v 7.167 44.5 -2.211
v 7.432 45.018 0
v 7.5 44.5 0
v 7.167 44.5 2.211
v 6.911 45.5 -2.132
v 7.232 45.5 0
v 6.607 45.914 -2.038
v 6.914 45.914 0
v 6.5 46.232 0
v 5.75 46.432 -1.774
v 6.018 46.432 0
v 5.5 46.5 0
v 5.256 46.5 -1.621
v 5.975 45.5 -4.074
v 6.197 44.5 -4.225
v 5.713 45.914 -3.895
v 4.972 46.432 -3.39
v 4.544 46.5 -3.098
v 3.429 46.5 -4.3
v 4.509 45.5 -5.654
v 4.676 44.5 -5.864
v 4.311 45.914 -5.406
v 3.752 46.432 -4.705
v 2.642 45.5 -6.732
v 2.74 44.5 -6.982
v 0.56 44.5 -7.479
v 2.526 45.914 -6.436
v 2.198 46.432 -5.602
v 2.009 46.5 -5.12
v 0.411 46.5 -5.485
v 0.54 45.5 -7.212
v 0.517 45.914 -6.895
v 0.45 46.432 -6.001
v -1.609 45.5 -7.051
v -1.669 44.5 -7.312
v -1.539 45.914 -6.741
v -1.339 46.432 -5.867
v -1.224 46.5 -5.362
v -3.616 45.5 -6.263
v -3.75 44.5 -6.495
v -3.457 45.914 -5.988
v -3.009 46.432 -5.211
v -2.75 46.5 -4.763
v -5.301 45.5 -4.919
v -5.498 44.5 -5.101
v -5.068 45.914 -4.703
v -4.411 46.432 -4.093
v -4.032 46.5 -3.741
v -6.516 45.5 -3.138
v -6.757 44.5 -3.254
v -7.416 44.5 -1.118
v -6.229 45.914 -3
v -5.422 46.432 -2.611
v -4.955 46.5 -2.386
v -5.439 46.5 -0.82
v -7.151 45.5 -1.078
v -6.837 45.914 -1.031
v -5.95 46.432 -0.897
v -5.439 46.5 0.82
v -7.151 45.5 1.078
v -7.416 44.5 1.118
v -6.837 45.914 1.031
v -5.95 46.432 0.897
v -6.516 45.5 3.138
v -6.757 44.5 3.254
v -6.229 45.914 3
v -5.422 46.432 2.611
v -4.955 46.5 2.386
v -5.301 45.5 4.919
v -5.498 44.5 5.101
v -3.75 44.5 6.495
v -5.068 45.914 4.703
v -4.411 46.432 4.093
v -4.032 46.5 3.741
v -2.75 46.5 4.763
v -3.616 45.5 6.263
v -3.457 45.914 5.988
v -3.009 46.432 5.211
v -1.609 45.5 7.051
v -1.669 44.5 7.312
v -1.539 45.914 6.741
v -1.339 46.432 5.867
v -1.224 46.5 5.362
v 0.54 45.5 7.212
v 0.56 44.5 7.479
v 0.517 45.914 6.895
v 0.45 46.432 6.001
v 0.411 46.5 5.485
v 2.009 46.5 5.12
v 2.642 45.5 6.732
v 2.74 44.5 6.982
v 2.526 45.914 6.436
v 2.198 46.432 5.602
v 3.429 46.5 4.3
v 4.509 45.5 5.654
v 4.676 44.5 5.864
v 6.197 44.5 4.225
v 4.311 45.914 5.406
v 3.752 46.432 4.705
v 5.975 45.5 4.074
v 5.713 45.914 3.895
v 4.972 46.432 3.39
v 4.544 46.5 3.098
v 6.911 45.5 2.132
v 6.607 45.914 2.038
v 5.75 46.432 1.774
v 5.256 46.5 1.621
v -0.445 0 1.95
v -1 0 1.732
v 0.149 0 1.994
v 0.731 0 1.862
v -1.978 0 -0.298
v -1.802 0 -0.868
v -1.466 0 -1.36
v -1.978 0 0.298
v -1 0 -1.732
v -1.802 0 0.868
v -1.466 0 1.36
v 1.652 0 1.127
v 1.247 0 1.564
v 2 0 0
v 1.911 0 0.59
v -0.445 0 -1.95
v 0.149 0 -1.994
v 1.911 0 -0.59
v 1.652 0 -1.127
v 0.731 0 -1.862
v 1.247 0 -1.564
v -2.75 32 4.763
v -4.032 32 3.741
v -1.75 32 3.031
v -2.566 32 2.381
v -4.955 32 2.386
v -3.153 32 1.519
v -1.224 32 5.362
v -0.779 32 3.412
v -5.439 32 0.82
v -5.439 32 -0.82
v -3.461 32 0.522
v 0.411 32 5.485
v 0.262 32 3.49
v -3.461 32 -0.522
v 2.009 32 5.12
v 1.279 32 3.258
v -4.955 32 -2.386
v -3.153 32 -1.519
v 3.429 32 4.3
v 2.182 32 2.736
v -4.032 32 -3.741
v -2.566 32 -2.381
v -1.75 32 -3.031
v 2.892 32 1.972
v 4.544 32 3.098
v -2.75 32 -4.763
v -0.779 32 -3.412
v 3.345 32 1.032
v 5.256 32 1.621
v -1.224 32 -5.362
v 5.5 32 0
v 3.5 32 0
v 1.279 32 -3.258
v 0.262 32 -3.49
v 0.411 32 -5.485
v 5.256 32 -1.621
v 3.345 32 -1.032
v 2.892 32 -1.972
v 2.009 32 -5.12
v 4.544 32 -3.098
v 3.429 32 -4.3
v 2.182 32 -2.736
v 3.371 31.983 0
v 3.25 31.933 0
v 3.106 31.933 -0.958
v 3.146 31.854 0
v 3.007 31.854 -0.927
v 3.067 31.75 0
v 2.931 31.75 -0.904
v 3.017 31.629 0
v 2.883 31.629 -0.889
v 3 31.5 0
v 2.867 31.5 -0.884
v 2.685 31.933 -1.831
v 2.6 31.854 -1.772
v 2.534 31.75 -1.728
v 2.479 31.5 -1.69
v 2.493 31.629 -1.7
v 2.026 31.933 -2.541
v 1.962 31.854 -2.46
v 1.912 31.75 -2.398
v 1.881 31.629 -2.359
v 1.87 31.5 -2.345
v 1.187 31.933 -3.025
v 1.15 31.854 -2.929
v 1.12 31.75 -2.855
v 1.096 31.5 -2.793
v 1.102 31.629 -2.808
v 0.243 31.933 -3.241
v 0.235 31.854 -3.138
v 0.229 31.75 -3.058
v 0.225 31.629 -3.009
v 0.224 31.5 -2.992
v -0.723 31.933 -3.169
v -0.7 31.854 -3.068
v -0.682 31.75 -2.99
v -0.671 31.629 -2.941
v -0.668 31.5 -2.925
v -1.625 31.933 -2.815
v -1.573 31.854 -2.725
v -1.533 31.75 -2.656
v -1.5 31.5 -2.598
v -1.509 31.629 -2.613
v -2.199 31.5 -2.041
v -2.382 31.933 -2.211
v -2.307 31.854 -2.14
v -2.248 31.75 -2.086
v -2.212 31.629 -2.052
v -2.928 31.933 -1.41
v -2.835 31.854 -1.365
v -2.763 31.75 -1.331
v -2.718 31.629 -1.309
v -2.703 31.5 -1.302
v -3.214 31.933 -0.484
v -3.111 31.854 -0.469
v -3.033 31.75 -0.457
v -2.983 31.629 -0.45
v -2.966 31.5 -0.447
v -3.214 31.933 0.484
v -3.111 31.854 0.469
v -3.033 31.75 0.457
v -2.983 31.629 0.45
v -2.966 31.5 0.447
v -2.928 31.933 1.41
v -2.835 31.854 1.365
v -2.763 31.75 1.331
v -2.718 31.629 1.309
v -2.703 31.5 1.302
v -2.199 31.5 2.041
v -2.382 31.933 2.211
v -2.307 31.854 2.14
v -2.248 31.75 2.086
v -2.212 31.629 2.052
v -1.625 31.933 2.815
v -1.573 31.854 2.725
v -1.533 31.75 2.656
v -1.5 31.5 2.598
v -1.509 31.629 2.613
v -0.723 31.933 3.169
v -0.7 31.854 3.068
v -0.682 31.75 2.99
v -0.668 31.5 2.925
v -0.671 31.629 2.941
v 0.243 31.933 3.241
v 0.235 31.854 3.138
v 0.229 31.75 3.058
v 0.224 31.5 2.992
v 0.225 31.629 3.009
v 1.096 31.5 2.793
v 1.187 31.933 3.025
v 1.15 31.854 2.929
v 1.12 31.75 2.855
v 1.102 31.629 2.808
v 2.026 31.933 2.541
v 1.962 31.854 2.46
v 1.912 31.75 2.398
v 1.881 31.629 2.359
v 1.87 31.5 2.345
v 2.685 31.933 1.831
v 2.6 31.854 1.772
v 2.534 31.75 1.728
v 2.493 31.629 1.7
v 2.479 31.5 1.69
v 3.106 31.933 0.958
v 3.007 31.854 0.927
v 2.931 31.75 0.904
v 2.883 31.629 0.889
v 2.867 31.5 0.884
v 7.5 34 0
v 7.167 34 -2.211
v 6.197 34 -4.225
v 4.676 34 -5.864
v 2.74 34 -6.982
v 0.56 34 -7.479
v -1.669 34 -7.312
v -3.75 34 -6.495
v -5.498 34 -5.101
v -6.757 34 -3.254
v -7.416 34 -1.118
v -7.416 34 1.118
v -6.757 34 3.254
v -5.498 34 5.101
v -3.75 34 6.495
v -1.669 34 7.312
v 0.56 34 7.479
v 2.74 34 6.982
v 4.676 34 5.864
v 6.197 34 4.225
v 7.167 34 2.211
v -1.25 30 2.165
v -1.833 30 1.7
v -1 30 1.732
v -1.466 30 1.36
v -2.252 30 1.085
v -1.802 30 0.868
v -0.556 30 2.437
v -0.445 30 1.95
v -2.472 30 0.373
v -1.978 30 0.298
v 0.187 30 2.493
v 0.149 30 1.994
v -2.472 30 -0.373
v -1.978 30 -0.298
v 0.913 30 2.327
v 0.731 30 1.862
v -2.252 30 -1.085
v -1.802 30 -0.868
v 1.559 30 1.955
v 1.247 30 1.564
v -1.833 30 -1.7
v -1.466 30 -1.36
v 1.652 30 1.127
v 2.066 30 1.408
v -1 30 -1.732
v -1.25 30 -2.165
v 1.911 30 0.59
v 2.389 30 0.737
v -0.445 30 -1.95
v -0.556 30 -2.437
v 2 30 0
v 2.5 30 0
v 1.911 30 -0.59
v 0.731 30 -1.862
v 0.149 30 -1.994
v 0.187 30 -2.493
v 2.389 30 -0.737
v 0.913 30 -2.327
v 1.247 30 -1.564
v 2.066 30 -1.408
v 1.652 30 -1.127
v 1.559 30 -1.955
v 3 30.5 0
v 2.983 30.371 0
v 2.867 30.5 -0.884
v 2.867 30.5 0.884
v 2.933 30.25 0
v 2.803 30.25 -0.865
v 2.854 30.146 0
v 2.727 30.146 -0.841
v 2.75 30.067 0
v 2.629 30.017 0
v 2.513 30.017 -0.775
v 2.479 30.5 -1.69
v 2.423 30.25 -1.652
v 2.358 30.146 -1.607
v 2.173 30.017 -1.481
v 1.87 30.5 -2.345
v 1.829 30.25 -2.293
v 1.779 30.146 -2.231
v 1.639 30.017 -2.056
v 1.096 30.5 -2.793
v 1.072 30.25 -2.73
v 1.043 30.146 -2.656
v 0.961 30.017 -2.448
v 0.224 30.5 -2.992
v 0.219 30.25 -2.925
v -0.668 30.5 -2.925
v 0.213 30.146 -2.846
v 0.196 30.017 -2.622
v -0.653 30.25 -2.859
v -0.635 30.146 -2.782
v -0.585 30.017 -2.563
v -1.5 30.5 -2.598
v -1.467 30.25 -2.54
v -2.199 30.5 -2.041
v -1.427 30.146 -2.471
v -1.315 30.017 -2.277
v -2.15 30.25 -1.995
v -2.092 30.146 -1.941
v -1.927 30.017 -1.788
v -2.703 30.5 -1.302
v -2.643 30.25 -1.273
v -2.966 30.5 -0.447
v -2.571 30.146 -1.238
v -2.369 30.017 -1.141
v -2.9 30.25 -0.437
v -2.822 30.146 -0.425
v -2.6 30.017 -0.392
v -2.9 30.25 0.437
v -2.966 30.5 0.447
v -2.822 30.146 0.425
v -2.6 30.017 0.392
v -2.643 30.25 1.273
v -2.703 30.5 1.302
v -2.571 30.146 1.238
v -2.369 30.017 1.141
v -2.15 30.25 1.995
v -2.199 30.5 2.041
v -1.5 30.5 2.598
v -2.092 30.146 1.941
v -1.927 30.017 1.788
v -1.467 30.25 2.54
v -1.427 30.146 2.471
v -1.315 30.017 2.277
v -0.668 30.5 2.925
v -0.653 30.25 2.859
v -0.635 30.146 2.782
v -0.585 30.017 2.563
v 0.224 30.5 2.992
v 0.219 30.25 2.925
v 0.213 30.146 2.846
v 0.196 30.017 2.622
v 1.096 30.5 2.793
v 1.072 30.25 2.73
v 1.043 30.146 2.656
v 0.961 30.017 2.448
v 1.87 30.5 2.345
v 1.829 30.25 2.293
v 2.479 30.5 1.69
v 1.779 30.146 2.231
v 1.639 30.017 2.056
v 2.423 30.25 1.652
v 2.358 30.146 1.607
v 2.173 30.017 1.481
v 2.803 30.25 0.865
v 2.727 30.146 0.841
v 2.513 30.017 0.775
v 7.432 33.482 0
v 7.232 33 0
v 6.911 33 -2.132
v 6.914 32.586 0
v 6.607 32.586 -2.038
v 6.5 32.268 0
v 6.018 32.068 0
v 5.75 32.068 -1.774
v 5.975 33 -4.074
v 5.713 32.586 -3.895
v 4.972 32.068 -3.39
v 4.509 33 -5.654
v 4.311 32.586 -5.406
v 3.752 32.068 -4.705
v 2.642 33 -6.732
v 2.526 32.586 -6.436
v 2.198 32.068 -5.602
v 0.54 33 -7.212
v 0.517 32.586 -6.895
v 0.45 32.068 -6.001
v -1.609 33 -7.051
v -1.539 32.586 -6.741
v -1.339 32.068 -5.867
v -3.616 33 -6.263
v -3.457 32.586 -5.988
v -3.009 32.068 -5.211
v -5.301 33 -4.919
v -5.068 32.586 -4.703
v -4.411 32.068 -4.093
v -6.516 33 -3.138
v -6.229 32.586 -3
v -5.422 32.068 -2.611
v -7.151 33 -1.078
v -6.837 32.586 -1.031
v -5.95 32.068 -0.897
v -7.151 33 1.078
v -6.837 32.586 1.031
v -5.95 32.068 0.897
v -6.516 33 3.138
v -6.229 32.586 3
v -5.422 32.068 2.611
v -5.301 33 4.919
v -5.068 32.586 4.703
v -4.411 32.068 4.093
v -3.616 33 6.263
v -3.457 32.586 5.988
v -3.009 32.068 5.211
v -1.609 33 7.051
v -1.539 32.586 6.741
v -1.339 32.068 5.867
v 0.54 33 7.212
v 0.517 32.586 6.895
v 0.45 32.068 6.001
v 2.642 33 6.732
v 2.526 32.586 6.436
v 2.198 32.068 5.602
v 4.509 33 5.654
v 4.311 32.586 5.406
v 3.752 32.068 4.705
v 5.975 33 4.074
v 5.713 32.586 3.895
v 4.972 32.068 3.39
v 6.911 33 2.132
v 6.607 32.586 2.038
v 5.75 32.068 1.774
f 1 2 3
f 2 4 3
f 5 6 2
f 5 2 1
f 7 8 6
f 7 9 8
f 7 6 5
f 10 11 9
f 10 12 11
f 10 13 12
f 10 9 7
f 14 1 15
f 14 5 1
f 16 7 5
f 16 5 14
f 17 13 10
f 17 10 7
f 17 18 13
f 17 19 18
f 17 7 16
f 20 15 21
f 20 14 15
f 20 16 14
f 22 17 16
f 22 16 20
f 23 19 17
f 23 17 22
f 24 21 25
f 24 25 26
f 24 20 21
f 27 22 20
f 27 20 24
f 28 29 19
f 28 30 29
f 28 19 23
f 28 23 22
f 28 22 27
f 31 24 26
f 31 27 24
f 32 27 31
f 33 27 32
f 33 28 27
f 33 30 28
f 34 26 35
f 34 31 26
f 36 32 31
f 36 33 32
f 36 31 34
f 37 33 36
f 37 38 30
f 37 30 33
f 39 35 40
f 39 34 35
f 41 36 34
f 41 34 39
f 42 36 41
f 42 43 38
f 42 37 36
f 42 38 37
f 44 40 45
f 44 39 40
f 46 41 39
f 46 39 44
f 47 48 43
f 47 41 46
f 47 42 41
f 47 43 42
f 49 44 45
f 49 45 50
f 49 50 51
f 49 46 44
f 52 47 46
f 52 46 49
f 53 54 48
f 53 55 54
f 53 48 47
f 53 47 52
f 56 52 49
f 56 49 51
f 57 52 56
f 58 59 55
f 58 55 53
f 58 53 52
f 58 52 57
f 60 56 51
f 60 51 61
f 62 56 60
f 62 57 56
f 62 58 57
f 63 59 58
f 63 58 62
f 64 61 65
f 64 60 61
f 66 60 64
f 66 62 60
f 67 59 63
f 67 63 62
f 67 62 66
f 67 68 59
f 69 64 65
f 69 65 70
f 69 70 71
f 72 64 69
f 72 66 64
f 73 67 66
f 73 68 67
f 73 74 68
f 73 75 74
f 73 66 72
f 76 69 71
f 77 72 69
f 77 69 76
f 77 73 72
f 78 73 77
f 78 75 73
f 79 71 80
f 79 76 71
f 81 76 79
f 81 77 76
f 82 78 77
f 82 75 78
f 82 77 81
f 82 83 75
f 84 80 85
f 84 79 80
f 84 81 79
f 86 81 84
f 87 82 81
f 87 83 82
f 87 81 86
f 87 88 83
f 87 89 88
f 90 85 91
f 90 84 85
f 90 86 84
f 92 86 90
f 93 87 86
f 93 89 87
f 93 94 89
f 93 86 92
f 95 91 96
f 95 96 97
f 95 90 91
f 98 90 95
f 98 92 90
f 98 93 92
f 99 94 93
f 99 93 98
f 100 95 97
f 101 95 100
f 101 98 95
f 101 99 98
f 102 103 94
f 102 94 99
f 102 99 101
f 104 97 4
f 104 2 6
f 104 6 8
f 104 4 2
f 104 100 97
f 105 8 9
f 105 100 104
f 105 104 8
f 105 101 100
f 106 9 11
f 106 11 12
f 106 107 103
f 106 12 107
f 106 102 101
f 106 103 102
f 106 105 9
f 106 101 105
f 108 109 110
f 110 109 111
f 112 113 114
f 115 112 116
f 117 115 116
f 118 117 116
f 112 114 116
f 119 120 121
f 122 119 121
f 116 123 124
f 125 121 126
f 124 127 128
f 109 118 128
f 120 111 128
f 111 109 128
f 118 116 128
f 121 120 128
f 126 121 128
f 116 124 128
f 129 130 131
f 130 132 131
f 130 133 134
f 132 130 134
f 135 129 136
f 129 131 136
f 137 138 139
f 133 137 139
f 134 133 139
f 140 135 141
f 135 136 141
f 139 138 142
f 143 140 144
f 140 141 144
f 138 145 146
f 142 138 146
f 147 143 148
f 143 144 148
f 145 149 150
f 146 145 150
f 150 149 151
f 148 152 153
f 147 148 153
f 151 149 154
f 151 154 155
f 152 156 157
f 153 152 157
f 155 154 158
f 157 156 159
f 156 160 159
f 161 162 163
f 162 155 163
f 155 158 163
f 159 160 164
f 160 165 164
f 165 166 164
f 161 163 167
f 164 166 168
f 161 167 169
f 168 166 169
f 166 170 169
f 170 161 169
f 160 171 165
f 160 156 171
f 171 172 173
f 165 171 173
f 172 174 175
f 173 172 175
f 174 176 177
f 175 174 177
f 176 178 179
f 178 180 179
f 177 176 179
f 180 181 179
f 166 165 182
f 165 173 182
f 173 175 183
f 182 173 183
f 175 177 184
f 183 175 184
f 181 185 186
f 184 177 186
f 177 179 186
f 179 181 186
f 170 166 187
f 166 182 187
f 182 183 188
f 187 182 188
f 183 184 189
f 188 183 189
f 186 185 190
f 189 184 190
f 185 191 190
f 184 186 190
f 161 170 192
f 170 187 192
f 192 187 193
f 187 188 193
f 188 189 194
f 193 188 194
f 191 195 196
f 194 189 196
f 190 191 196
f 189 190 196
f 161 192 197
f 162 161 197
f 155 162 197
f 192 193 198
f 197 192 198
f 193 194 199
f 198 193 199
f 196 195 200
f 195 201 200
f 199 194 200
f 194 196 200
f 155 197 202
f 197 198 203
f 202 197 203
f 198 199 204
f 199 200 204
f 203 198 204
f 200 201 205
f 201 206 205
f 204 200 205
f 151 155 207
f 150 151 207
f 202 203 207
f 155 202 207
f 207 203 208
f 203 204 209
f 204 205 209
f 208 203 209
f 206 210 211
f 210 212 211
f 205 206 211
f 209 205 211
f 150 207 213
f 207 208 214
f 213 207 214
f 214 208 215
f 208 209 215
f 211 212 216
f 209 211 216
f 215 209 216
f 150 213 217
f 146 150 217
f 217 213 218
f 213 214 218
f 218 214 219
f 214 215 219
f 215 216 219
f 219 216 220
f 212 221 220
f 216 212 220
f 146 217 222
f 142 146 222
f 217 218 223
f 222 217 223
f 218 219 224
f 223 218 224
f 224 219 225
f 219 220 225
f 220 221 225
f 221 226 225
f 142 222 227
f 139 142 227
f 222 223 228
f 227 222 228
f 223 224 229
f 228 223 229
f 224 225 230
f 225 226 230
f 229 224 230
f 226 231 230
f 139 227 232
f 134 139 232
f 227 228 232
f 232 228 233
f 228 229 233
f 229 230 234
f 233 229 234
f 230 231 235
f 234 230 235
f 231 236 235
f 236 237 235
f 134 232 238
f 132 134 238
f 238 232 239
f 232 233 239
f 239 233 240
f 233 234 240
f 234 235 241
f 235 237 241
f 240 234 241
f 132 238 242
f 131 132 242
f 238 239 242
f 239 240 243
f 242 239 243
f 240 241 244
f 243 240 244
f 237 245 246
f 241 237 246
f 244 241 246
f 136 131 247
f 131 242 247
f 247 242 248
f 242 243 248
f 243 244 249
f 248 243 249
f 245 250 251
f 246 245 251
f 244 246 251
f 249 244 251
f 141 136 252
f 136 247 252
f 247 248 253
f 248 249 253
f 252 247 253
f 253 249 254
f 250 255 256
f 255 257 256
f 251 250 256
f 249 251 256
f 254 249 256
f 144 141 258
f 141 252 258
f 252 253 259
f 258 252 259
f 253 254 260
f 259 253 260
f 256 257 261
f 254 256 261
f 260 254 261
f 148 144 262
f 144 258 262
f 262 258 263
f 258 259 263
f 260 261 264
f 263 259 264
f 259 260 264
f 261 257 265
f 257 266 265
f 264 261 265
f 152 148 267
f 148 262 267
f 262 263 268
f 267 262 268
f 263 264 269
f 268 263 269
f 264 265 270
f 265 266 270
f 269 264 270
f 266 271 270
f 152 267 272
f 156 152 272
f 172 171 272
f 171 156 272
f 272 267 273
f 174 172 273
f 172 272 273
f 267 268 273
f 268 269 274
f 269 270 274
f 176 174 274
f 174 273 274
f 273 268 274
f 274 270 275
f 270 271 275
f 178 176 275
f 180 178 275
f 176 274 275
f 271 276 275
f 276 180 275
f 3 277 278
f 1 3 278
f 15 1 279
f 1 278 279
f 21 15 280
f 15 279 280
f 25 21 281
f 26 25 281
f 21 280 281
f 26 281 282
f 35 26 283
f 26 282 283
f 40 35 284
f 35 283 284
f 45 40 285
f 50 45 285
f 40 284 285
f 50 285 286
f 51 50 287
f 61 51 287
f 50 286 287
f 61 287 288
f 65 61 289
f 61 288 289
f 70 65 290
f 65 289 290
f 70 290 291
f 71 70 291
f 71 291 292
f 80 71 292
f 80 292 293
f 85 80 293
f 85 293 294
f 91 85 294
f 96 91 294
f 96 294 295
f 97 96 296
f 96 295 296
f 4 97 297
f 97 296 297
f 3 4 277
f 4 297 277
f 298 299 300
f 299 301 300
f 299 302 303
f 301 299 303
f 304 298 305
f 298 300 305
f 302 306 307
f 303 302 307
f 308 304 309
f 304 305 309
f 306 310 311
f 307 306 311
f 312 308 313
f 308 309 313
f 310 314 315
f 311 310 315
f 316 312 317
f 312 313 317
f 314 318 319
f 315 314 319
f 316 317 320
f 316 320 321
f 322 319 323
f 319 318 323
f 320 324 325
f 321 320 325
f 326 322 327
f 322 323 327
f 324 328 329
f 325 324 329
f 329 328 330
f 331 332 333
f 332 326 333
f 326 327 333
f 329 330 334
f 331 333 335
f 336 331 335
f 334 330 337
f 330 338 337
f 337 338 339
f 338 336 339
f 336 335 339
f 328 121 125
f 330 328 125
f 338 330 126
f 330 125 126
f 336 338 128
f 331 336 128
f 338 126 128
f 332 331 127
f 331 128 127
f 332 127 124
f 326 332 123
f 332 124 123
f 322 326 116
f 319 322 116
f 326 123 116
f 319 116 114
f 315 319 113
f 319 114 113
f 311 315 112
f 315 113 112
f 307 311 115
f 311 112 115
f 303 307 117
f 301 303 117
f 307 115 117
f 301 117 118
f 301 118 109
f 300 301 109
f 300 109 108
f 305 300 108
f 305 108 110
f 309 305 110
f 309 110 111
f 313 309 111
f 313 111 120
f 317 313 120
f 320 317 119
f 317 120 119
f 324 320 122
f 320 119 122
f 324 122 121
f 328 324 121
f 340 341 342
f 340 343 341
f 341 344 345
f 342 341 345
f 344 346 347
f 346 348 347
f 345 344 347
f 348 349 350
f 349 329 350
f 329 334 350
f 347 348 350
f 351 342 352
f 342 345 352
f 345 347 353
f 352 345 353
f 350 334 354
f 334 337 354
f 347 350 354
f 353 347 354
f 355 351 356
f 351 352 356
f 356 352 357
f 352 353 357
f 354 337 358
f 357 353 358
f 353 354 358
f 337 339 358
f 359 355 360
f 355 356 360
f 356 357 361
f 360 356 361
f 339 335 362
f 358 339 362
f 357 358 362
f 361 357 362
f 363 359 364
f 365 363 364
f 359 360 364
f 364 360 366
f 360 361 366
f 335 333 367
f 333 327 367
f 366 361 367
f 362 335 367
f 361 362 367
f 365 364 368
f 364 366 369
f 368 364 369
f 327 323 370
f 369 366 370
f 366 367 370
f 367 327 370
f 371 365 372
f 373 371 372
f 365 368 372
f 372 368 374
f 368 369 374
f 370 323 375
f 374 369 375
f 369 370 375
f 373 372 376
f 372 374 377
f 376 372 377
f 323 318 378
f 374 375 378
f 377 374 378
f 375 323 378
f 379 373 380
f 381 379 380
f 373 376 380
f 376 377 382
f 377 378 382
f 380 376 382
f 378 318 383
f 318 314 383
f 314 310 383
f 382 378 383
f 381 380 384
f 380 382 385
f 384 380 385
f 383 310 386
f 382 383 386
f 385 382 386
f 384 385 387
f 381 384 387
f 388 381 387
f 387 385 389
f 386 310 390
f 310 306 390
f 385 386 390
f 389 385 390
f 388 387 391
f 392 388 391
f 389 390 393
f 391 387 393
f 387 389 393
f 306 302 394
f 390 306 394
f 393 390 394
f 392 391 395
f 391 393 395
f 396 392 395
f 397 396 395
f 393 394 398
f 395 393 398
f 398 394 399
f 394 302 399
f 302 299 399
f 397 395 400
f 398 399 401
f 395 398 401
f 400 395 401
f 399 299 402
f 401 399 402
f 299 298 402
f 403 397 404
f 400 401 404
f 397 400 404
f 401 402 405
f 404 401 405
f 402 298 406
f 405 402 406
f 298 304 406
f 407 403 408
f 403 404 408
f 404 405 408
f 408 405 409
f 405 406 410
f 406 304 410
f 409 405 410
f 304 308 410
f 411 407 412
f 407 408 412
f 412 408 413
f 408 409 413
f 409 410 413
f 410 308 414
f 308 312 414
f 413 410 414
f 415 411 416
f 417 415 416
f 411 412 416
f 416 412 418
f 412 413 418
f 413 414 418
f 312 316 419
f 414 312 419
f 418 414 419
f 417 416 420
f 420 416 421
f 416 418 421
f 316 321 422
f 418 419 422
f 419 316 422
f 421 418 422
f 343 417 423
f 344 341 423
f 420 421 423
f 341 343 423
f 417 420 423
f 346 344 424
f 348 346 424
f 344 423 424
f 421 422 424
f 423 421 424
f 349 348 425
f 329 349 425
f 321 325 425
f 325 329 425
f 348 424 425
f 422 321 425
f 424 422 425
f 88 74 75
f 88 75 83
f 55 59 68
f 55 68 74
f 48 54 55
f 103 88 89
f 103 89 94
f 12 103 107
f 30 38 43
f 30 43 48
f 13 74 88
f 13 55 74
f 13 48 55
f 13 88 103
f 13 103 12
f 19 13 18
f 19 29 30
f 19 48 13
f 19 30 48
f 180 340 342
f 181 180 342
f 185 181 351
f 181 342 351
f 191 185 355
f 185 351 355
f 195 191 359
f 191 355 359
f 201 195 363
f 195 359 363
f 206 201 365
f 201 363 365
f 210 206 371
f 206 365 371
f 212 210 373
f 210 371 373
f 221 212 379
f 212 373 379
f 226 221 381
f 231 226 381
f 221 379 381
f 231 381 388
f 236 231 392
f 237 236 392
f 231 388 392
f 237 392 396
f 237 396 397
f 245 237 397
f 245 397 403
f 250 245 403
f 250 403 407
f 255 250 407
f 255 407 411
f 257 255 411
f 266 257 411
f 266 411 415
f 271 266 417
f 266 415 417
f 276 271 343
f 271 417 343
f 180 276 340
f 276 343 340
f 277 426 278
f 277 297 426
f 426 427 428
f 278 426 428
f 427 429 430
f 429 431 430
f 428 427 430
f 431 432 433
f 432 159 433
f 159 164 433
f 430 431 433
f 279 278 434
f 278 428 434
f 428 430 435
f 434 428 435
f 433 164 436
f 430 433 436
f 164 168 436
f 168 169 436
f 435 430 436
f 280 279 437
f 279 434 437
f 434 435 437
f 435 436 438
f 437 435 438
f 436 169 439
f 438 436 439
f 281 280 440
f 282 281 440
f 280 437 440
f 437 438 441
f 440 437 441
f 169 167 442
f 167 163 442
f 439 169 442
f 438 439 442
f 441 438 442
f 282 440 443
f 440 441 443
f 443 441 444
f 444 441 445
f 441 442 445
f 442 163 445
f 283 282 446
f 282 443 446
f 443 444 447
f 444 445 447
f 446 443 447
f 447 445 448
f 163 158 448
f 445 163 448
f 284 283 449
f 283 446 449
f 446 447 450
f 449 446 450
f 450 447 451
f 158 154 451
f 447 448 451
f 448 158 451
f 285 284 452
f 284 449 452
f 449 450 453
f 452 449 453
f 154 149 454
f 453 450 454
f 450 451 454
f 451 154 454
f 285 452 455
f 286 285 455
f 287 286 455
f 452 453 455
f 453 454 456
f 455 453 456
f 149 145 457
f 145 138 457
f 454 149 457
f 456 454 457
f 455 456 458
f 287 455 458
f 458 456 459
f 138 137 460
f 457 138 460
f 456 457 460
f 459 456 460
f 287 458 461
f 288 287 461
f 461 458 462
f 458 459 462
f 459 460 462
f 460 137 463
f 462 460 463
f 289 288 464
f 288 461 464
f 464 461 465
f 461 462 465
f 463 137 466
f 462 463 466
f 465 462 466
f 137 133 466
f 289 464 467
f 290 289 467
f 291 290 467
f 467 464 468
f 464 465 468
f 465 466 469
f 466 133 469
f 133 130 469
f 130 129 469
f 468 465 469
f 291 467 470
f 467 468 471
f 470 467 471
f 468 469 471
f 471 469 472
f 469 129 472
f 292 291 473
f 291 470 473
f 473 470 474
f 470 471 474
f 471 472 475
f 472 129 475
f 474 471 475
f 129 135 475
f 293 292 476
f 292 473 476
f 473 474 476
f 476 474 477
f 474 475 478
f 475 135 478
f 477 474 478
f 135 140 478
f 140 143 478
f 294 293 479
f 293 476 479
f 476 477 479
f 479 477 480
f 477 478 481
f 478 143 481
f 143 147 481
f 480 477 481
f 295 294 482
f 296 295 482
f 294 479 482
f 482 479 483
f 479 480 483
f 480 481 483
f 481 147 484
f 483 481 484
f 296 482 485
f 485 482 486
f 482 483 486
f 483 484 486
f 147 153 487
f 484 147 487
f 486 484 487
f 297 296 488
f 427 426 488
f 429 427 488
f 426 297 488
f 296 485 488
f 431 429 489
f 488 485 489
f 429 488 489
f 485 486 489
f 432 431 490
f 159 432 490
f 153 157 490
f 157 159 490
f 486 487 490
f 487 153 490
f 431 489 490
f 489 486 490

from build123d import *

# Parameters (mm, degrees)
SKETCH_1_R      = 2
EXTRUDE_1_DEPTH = 30
SKETCH_2_R      = 3
EXTRUDE_2_DEPTH = 2
SKETCH_3_R      = 7.5
EXTRUDE_3_DEPTH = 14.5
FILLET_1_R      = 2
FILLET_2_R      = 0.5


with BuildPart() as part:
    # 草图1 → 凸台-拉伸1 (new body)
    with BuildSketch(Plane(origin=(0, 0, 0), x_dir=(1, 0, 0), z_dir=(0, 1, 0))):
        Circle(SKETCH_1_R)
    extrude(amount=EXTRUDE_1_DEPTH)

    # 草图2 → 凸台-拉伸2 (add)
    with BuildSketch(Plane(origin=(0, 30, 0), x_dir=(1, 0, 0), z_dir=(0, 1, 0))):
        Circle(SKETCH_2_R)
    extrude(amount=EXTRUDE_2_DEPTH)

    # 草图3 → 凸台-拉伸3 (add)
    with BuildSketch(Plane(origin=(0, 32, 0), x_dir=(1, 0, 0), z_dir=(0, 1, 0))):
        Circle(SKETCH_3_R)
    extrude(amount=EXTRUDE_3_DEPTH)

    # 圆角1
    fillet_1_edges = [part.edges().sort_by_distance(p)[0] for p in [
        (-7.5, 32, 0),
        (-7.5, 46.5, 0),
    ]]
    fillet(fillet_1_edges, radius=FILLET_1_R)

    # 圆角2
    fillet_2_edges = [part.edges().sort_by_distance(p)[0] for p in [
        (-3, 30, 0),
        (-3, 32, 0),
    ]]
    fillet(fillet_2_edges, radius=FILLET_2_R)


solid = part.part
